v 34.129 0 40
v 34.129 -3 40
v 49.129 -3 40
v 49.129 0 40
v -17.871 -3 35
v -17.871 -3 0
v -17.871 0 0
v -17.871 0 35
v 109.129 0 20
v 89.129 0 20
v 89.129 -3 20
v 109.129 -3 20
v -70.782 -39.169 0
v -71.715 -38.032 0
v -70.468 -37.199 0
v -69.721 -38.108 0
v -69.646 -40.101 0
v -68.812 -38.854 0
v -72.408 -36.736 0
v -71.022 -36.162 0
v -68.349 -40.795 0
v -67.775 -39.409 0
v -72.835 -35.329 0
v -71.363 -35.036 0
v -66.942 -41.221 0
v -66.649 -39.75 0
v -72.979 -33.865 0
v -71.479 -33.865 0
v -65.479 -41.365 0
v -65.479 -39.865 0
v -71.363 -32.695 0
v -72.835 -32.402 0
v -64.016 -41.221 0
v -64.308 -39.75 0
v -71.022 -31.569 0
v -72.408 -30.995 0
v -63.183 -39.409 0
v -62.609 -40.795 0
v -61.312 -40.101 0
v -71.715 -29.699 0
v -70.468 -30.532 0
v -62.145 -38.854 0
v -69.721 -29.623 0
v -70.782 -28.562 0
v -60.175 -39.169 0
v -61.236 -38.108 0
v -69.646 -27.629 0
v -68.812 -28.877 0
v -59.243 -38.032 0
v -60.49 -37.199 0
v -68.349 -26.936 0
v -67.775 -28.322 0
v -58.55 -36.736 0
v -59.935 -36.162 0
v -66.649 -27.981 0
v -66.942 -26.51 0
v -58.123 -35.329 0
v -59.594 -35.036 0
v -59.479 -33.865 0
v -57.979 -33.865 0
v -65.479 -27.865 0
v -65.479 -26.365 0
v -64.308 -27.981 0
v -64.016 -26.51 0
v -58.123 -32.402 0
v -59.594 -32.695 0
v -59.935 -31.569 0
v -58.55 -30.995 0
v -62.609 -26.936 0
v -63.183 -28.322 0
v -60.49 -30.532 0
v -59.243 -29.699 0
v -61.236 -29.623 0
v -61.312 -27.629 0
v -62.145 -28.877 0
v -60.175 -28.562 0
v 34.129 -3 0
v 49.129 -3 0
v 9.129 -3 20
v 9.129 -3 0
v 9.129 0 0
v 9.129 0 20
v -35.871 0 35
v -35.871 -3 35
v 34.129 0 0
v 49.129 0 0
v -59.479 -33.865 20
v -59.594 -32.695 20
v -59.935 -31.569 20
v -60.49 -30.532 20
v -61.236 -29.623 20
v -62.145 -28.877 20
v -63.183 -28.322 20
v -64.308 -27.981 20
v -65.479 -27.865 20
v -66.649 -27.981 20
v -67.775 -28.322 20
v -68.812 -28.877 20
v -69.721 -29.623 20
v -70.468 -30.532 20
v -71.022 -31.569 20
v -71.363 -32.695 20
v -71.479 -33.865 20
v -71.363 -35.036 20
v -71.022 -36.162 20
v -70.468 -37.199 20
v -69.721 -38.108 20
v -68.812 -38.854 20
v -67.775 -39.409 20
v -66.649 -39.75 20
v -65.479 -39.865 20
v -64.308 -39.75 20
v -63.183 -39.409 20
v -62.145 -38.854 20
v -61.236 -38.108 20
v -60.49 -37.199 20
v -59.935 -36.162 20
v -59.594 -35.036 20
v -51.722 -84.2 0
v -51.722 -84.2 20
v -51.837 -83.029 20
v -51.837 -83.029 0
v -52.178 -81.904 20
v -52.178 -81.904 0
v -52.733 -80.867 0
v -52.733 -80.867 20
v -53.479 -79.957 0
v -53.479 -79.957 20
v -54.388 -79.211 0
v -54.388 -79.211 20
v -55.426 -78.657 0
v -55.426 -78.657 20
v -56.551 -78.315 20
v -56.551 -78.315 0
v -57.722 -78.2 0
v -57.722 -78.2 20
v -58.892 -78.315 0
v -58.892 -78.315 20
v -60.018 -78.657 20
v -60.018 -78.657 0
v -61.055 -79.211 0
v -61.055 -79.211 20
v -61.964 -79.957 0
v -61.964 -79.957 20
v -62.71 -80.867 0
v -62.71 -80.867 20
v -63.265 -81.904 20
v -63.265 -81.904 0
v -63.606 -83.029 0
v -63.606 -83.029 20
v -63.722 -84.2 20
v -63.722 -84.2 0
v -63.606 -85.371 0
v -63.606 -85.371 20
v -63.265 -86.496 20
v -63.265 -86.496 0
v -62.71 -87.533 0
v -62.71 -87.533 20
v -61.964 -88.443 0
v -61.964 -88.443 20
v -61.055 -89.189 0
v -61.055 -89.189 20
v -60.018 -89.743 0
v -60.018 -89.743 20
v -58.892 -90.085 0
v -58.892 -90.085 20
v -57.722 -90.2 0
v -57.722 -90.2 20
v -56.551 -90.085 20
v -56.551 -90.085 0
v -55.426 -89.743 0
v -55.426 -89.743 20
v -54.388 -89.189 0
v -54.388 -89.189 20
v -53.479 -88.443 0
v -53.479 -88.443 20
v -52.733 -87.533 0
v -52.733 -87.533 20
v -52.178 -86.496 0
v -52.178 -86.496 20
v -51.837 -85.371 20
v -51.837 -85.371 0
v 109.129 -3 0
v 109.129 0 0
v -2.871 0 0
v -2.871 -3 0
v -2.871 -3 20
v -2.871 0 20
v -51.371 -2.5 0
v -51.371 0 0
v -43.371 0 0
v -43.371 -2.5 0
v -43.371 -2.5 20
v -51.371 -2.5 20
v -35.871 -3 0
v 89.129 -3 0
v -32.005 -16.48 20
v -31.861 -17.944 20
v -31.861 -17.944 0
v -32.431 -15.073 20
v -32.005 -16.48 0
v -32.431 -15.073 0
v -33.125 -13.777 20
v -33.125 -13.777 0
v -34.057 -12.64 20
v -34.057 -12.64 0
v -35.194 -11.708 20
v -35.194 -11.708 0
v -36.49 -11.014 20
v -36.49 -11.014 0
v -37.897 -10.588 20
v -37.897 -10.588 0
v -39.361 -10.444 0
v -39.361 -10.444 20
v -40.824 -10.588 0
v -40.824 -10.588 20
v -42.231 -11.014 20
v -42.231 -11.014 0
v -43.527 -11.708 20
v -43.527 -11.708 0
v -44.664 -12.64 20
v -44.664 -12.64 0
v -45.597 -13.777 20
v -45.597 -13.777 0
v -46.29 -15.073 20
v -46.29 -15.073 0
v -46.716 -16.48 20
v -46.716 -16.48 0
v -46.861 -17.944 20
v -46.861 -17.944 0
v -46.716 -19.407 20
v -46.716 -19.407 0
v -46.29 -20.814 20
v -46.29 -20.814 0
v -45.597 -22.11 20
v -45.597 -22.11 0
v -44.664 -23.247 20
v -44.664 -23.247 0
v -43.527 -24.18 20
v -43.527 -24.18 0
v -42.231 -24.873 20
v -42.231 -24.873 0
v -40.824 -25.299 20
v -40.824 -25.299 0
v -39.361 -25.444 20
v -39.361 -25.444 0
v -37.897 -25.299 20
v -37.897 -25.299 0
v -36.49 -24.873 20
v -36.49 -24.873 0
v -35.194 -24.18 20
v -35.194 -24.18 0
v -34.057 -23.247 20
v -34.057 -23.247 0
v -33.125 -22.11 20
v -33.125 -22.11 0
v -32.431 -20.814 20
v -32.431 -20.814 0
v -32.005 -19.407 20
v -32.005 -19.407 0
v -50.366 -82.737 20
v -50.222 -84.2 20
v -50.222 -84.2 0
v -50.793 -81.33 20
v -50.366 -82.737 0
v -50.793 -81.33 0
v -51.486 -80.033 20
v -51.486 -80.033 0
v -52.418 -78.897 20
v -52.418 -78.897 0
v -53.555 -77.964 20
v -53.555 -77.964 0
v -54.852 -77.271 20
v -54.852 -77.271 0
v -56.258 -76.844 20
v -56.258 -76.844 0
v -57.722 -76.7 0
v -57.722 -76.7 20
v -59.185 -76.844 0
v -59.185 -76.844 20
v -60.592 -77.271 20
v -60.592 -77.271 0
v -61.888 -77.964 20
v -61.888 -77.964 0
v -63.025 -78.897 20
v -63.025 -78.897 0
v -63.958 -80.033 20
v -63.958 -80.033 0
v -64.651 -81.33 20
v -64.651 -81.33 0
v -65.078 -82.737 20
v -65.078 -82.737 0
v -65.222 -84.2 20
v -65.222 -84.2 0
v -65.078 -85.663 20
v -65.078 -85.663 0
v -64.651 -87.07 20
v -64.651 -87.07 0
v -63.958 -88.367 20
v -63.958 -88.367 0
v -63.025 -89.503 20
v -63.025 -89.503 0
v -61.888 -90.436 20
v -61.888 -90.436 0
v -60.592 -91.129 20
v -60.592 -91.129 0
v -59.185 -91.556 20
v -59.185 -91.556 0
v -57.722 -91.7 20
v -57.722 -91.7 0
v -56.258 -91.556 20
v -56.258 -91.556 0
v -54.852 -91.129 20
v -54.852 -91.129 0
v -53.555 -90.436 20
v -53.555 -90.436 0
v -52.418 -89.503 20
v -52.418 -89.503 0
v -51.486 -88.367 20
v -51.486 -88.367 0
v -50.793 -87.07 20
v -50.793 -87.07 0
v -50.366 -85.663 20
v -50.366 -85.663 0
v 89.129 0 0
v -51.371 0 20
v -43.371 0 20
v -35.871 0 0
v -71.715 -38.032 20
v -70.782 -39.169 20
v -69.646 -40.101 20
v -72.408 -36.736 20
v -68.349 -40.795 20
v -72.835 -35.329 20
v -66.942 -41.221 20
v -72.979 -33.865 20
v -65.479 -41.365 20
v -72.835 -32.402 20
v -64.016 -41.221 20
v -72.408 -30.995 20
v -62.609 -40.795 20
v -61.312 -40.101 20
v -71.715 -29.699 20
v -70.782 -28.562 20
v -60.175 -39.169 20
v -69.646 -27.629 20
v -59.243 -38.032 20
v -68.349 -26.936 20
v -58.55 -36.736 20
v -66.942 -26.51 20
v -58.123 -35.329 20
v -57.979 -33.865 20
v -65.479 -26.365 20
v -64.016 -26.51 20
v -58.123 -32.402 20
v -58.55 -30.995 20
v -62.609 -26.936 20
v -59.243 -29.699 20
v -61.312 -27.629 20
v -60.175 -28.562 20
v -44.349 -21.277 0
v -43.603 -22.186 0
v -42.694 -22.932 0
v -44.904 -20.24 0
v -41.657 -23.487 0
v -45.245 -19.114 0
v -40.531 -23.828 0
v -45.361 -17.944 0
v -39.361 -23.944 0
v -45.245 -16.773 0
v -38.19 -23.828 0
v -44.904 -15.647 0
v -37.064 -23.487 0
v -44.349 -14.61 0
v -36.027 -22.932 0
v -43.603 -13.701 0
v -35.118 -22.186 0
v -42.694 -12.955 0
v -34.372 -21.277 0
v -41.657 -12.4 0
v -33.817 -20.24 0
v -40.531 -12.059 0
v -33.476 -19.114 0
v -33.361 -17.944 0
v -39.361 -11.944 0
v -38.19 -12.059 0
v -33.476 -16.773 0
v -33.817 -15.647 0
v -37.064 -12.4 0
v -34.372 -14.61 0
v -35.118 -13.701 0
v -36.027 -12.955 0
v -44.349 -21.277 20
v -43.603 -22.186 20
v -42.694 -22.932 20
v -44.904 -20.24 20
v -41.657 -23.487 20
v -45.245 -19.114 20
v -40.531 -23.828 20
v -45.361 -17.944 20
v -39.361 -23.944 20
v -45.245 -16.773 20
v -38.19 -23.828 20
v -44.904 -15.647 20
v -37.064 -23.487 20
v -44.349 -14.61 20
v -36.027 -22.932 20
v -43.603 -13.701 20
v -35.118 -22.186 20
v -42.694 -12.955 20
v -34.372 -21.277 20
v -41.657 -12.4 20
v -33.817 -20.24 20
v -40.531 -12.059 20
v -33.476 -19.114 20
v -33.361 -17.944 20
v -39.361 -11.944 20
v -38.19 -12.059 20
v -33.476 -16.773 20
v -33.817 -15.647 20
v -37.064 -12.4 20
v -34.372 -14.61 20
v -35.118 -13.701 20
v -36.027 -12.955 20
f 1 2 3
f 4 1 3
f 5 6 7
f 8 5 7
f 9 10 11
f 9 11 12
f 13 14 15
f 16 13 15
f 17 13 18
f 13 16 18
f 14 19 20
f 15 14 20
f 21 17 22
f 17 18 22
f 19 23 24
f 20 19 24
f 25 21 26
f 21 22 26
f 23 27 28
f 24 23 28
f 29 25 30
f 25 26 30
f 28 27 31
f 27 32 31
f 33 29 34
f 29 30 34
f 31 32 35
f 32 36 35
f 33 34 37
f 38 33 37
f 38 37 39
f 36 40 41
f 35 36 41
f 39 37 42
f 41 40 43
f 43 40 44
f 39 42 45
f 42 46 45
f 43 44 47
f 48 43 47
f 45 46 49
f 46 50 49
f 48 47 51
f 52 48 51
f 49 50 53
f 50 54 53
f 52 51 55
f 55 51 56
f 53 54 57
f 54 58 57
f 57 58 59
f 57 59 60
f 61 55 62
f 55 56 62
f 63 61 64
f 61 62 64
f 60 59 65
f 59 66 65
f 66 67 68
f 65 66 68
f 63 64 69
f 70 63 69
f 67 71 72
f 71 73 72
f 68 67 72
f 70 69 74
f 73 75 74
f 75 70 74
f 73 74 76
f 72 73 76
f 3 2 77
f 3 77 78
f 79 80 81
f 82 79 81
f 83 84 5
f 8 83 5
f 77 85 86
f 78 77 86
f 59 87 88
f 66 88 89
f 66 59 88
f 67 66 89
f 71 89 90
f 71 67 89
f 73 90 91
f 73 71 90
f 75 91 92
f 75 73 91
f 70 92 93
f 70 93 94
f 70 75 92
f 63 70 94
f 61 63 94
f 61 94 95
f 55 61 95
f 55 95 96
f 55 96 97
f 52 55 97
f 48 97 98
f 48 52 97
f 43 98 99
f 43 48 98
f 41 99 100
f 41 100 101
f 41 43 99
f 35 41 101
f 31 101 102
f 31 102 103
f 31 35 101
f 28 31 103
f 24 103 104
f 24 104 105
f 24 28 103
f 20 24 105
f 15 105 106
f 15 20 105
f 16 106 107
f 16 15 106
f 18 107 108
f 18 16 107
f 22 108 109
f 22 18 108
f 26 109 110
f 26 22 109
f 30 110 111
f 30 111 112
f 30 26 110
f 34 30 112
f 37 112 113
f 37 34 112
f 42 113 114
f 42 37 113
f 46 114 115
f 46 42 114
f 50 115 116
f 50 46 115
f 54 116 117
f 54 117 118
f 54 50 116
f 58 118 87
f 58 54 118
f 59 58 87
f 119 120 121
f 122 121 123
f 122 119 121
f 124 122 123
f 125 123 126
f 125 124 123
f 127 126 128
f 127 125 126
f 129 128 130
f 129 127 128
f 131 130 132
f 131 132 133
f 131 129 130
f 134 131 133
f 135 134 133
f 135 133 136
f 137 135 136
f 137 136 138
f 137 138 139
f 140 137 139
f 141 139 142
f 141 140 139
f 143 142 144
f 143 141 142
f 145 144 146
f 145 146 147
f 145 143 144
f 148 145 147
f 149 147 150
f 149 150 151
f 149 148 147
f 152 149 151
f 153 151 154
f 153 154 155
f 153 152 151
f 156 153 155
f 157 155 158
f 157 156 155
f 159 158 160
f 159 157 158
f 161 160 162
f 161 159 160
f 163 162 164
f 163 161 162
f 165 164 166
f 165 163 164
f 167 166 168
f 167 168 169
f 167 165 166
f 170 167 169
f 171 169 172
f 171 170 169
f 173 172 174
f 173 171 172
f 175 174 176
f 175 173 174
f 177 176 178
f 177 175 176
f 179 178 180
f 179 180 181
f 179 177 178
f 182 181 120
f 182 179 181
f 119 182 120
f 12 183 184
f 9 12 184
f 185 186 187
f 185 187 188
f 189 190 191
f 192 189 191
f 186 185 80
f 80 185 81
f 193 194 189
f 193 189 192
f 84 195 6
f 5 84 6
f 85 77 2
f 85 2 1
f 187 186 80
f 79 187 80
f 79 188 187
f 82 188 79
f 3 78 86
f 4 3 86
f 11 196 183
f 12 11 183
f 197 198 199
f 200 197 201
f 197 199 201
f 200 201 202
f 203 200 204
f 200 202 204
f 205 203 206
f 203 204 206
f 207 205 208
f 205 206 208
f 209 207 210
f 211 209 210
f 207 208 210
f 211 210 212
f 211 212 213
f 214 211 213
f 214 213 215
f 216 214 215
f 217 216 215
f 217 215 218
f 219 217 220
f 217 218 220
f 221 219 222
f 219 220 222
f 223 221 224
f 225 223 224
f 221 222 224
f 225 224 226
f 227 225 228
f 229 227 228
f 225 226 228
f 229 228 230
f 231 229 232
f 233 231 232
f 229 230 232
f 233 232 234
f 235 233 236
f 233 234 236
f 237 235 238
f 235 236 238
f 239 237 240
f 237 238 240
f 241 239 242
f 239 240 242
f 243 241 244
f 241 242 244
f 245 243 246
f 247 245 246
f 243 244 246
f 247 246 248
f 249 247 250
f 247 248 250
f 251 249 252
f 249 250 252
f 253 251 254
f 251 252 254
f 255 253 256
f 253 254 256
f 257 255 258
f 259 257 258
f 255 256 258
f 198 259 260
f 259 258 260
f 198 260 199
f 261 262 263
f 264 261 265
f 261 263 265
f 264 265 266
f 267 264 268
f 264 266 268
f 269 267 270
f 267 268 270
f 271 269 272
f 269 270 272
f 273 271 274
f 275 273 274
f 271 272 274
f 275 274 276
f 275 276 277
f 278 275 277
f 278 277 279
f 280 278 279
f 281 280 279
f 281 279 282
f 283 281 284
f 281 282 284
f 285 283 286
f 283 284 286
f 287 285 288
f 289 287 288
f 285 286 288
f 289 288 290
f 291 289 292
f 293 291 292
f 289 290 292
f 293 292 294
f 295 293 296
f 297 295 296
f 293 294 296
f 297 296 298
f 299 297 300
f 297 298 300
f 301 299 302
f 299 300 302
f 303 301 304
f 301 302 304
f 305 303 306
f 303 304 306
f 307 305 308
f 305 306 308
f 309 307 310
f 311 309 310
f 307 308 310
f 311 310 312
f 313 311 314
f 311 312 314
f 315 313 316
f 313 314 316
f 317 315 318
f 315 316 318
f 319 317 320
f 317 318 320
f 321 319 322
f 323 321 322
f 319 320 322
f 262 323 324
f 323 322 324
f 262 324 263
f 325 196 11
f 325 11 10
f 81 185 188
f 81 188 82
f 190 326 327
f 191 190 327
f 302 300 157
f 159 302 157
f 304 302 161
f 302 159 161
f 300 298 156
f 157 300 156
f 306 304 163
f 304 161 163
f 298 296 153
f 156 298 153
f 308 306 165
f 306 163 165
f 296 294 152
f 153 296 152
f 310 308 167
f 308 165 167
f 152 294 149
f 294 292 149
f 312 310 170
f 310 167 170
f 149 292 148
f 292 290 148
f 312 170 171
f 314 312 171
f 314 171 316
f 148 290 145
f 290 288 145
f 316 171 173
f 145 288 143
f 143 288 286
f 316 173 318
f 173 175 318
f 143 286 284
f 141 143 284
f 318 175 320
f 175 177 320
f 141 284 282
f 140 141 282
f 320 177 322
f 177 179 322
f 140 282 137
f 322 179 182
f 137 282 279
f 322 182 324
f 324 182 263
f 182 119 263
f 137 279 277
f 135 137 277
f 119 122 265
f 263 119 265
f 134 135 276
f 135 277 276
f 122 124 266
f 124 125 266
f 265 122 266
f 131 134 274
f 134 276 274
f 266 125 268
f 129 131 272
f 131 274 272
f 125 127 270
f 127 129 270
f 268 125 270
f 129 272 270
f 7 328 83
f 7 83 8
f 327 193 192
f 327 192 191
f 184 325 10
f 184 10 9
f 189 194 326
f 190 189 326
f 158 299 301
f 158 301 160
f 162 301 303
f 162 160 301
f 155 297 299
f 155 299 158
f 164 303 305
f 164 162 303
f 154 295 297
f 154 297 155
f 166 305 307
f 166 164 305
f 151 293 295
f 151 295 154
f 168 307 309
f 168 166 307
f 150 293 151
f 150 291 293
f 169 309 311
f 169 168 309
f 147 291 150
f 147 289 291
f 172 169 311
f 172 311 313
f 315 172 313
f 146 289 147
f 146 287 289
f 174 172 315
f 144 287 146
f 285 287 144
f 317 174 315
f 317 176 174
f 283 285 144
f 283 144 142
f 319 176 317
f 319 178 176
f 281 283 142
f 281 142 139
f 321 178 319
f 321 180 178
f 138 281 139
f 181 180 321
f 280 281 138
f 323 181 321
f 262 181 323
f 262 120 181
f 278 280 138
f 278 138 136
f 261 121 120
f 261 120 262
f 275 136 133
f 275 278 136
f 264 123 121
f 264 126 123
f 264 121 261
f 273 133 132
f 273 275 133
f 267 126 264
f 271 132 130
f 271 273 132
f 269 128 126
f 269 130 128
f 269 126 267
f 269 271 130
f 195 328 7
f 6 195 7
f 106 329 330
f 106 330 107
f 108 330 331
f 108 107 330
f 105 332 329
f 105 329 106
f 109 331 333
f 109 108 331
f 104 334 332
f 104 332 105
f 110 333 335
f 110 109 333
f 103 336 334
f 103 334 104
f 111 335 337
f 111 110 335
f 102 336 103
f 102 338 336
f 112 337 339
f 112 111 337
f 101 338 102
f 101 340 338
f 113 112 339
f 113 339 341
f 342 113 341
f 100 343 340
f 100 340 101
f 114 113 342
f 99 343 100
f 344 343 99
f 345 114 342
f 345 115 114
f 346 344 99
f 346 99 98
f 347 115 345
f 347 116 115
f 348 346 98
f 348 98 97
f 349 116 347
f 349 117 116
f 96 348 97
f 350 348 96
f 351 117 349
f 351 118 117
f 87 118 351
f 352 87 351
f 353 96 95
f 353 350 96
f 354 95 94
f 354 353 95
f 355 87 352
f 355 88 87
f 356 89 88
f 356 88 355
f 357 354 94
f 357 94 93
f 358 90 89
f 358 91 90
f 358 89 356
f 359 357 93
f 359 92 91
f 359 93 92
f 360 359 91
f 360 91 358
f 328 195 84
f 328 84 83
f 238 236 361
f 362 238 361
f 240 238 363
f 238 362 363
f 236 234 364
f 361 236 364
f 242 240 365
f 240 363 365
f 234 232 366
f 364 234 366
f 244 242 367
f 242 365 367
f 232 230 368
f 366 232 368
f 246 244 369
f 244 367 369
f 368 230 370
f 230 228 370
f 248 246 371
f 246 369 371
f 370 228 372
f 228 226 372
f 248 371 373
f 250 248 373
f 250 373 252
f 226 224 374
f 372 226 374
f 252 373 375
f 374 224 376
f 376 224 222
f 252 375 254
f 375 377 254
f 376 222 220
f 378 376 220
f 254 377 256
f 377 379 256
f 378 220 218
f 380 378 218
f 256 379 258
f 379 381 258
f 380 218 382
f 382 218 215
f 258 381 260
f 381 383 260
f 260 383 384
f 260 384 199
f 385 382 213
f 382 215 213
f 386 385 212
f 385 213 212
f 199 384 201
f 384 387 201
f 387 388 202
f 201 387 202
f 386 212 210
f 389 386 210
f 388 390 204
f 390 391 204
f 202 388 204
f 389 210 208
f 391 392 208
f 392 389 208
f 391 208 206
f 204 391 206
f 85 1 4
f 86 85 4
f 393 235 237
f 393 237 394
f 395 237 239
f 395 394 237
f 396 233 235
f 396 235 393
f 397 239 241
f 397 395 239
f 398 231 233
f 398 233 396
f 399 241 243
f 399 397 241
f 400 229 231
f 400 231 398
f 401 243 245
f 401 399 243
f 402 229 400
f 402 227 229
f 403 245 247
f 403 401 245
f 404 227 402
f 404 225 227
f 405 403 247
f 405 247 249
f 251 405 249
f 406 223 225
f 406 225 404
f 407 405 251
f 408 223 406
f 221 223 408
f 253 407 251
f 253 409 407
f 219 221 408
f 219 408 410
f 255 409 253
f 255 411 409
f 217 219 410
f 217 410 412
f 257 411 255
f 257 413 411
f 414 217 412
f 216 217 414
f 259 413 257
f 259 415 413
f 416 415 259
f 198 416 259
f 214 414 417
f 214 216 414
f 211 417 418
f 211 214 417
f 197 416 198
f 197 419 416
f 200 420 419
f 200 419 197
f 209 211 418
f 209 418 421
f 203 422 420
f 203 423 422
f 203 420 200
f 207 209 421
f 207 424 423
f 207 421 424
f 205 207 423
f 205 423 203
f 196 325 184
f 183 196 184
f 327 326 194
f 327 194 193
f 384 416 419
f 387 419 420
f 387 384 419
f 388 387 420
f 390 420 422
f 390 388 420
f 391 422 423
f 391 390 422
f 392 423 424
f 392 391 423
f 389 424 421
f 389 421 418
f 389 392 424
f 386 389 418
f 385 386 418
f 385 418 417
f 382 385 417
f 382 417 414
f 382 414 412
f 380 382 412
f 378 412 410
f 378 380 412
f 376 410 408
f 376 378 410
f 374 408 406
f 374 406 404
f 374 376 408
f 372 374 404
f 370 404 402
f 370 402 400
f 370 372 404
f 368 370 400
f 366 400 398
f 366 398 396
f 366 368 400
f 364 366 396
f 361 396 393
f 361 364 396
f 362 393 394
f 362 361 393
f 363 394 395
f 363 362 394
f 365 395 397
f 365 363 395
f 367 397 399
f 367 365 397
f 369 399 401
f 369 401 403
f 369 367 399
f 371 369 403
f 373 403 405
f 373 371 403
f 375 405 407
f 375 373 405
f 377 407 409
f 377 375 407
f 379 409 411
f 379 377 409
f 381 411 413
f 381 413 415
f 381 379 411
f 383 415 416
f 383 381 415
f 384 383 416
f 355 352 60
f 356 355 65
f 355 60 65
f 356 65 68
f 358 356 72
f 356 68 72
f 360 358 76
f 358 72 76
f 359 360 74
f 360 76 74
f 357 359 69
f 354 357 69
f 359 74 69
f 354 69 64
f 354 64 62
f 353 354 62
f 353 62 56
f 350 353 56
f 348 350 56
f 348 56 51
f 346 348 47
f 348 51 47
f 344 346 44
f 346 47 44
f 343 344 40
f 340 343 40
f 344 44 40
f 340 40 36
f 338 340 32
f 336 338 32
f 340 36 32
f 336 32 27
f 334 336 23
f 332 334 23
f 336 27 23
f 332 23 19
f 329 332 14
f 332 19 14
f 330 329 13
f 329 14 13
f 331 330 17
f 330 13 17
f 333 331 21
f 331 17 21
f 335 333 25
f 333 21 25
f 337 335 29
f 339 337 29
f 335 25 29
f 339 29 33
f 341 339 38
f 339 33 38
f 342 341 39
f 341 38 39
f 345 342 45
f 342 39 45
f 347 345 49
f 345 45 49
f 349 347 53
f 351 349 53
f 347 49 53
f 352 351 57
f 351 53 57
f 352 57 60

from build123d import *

# Parameters (mm, degrees)
F0_W        = 8
F0_H        = 2.5
F0_W_2      = 18
F0_H_2      = 3
F0_W_3      = 12
F0_W_4      = 15
F0_W_5      = 20
F0_R        = 7.5
F0_R_2      = 6
F1_DEPTH    = 20
F1_FACE_W   = 18
F1_FACE_H   = 3
F2_DEPTH    = 35
F1_FACE_W_2 = 15
F3_DEPTH    = 40


with BuildPart() as f1:
    # F0 (on Top) → F1 (new body)
    with BuildSketch(Plane.XY):
        with Locations((-47.370826, -1.25)):
            Rectangle(F0_W, F0_H)
        with Locations((-26.870826, -1.5)):
            Rectangle(F0_W_2, F0_H_2)
        with Locations((3.129174, -1.5)):
            Rectangle(F0_W_3, F0_H_2)
        with Locations((41.629174, -1.5)):
            Rectangle(F0_W_4, F0_H_2)
        with Locations((99.129174, -1.5)):
            Rectangle(F0_W_5, F0_H_2)
        with Locations((-39.360523, -17.943569)):
            Circle(F0_R)
        with Locations((-39.360523, -17.943569)):
            Circle(F0_R_2, mode=Mode.SUBTRACT)
        with Locations((-57.721656, -84.200002)):
            Circle(F0_R)
        with Locations((-57.721656, -84.200002)):
            Circle(F0_R_2, mode=Mode.SUBTRACT)
        with Locations((-65.478727, -33.865448)):
            Circle(F0_R)
        with Locations((-65.478727, -33.865448)):
            Circle(F0_R_2, mode=Mode.SUBTRACT)
    extrude(amount=F1_DEPTH)

    # F1_face (on face) → F2 (join)
    with BuildSketch(Plane(origin=(-26.870826, -1.5, 0), x_dir=(1, 0, 0), z_dir=(0, 0, -1))):
        Rectangle(F1_FACE_W, F1_FACE_H)
    extrude(amount=-F2_DEPTH)

    # F1_face (on face) → F3 (join)
    with BuildSketch(Plane(origin=(-26.870826, -1.5, 0), x_dir=(1, 0, 0), z_dir=(0, 0, -1))):
        with Locations((68.5, 0)):
            Rectangle(F1_FACE_W_2, F1_FACE_H)
    extrude(amount=-F3_DEPTH)


solid = f1.part
